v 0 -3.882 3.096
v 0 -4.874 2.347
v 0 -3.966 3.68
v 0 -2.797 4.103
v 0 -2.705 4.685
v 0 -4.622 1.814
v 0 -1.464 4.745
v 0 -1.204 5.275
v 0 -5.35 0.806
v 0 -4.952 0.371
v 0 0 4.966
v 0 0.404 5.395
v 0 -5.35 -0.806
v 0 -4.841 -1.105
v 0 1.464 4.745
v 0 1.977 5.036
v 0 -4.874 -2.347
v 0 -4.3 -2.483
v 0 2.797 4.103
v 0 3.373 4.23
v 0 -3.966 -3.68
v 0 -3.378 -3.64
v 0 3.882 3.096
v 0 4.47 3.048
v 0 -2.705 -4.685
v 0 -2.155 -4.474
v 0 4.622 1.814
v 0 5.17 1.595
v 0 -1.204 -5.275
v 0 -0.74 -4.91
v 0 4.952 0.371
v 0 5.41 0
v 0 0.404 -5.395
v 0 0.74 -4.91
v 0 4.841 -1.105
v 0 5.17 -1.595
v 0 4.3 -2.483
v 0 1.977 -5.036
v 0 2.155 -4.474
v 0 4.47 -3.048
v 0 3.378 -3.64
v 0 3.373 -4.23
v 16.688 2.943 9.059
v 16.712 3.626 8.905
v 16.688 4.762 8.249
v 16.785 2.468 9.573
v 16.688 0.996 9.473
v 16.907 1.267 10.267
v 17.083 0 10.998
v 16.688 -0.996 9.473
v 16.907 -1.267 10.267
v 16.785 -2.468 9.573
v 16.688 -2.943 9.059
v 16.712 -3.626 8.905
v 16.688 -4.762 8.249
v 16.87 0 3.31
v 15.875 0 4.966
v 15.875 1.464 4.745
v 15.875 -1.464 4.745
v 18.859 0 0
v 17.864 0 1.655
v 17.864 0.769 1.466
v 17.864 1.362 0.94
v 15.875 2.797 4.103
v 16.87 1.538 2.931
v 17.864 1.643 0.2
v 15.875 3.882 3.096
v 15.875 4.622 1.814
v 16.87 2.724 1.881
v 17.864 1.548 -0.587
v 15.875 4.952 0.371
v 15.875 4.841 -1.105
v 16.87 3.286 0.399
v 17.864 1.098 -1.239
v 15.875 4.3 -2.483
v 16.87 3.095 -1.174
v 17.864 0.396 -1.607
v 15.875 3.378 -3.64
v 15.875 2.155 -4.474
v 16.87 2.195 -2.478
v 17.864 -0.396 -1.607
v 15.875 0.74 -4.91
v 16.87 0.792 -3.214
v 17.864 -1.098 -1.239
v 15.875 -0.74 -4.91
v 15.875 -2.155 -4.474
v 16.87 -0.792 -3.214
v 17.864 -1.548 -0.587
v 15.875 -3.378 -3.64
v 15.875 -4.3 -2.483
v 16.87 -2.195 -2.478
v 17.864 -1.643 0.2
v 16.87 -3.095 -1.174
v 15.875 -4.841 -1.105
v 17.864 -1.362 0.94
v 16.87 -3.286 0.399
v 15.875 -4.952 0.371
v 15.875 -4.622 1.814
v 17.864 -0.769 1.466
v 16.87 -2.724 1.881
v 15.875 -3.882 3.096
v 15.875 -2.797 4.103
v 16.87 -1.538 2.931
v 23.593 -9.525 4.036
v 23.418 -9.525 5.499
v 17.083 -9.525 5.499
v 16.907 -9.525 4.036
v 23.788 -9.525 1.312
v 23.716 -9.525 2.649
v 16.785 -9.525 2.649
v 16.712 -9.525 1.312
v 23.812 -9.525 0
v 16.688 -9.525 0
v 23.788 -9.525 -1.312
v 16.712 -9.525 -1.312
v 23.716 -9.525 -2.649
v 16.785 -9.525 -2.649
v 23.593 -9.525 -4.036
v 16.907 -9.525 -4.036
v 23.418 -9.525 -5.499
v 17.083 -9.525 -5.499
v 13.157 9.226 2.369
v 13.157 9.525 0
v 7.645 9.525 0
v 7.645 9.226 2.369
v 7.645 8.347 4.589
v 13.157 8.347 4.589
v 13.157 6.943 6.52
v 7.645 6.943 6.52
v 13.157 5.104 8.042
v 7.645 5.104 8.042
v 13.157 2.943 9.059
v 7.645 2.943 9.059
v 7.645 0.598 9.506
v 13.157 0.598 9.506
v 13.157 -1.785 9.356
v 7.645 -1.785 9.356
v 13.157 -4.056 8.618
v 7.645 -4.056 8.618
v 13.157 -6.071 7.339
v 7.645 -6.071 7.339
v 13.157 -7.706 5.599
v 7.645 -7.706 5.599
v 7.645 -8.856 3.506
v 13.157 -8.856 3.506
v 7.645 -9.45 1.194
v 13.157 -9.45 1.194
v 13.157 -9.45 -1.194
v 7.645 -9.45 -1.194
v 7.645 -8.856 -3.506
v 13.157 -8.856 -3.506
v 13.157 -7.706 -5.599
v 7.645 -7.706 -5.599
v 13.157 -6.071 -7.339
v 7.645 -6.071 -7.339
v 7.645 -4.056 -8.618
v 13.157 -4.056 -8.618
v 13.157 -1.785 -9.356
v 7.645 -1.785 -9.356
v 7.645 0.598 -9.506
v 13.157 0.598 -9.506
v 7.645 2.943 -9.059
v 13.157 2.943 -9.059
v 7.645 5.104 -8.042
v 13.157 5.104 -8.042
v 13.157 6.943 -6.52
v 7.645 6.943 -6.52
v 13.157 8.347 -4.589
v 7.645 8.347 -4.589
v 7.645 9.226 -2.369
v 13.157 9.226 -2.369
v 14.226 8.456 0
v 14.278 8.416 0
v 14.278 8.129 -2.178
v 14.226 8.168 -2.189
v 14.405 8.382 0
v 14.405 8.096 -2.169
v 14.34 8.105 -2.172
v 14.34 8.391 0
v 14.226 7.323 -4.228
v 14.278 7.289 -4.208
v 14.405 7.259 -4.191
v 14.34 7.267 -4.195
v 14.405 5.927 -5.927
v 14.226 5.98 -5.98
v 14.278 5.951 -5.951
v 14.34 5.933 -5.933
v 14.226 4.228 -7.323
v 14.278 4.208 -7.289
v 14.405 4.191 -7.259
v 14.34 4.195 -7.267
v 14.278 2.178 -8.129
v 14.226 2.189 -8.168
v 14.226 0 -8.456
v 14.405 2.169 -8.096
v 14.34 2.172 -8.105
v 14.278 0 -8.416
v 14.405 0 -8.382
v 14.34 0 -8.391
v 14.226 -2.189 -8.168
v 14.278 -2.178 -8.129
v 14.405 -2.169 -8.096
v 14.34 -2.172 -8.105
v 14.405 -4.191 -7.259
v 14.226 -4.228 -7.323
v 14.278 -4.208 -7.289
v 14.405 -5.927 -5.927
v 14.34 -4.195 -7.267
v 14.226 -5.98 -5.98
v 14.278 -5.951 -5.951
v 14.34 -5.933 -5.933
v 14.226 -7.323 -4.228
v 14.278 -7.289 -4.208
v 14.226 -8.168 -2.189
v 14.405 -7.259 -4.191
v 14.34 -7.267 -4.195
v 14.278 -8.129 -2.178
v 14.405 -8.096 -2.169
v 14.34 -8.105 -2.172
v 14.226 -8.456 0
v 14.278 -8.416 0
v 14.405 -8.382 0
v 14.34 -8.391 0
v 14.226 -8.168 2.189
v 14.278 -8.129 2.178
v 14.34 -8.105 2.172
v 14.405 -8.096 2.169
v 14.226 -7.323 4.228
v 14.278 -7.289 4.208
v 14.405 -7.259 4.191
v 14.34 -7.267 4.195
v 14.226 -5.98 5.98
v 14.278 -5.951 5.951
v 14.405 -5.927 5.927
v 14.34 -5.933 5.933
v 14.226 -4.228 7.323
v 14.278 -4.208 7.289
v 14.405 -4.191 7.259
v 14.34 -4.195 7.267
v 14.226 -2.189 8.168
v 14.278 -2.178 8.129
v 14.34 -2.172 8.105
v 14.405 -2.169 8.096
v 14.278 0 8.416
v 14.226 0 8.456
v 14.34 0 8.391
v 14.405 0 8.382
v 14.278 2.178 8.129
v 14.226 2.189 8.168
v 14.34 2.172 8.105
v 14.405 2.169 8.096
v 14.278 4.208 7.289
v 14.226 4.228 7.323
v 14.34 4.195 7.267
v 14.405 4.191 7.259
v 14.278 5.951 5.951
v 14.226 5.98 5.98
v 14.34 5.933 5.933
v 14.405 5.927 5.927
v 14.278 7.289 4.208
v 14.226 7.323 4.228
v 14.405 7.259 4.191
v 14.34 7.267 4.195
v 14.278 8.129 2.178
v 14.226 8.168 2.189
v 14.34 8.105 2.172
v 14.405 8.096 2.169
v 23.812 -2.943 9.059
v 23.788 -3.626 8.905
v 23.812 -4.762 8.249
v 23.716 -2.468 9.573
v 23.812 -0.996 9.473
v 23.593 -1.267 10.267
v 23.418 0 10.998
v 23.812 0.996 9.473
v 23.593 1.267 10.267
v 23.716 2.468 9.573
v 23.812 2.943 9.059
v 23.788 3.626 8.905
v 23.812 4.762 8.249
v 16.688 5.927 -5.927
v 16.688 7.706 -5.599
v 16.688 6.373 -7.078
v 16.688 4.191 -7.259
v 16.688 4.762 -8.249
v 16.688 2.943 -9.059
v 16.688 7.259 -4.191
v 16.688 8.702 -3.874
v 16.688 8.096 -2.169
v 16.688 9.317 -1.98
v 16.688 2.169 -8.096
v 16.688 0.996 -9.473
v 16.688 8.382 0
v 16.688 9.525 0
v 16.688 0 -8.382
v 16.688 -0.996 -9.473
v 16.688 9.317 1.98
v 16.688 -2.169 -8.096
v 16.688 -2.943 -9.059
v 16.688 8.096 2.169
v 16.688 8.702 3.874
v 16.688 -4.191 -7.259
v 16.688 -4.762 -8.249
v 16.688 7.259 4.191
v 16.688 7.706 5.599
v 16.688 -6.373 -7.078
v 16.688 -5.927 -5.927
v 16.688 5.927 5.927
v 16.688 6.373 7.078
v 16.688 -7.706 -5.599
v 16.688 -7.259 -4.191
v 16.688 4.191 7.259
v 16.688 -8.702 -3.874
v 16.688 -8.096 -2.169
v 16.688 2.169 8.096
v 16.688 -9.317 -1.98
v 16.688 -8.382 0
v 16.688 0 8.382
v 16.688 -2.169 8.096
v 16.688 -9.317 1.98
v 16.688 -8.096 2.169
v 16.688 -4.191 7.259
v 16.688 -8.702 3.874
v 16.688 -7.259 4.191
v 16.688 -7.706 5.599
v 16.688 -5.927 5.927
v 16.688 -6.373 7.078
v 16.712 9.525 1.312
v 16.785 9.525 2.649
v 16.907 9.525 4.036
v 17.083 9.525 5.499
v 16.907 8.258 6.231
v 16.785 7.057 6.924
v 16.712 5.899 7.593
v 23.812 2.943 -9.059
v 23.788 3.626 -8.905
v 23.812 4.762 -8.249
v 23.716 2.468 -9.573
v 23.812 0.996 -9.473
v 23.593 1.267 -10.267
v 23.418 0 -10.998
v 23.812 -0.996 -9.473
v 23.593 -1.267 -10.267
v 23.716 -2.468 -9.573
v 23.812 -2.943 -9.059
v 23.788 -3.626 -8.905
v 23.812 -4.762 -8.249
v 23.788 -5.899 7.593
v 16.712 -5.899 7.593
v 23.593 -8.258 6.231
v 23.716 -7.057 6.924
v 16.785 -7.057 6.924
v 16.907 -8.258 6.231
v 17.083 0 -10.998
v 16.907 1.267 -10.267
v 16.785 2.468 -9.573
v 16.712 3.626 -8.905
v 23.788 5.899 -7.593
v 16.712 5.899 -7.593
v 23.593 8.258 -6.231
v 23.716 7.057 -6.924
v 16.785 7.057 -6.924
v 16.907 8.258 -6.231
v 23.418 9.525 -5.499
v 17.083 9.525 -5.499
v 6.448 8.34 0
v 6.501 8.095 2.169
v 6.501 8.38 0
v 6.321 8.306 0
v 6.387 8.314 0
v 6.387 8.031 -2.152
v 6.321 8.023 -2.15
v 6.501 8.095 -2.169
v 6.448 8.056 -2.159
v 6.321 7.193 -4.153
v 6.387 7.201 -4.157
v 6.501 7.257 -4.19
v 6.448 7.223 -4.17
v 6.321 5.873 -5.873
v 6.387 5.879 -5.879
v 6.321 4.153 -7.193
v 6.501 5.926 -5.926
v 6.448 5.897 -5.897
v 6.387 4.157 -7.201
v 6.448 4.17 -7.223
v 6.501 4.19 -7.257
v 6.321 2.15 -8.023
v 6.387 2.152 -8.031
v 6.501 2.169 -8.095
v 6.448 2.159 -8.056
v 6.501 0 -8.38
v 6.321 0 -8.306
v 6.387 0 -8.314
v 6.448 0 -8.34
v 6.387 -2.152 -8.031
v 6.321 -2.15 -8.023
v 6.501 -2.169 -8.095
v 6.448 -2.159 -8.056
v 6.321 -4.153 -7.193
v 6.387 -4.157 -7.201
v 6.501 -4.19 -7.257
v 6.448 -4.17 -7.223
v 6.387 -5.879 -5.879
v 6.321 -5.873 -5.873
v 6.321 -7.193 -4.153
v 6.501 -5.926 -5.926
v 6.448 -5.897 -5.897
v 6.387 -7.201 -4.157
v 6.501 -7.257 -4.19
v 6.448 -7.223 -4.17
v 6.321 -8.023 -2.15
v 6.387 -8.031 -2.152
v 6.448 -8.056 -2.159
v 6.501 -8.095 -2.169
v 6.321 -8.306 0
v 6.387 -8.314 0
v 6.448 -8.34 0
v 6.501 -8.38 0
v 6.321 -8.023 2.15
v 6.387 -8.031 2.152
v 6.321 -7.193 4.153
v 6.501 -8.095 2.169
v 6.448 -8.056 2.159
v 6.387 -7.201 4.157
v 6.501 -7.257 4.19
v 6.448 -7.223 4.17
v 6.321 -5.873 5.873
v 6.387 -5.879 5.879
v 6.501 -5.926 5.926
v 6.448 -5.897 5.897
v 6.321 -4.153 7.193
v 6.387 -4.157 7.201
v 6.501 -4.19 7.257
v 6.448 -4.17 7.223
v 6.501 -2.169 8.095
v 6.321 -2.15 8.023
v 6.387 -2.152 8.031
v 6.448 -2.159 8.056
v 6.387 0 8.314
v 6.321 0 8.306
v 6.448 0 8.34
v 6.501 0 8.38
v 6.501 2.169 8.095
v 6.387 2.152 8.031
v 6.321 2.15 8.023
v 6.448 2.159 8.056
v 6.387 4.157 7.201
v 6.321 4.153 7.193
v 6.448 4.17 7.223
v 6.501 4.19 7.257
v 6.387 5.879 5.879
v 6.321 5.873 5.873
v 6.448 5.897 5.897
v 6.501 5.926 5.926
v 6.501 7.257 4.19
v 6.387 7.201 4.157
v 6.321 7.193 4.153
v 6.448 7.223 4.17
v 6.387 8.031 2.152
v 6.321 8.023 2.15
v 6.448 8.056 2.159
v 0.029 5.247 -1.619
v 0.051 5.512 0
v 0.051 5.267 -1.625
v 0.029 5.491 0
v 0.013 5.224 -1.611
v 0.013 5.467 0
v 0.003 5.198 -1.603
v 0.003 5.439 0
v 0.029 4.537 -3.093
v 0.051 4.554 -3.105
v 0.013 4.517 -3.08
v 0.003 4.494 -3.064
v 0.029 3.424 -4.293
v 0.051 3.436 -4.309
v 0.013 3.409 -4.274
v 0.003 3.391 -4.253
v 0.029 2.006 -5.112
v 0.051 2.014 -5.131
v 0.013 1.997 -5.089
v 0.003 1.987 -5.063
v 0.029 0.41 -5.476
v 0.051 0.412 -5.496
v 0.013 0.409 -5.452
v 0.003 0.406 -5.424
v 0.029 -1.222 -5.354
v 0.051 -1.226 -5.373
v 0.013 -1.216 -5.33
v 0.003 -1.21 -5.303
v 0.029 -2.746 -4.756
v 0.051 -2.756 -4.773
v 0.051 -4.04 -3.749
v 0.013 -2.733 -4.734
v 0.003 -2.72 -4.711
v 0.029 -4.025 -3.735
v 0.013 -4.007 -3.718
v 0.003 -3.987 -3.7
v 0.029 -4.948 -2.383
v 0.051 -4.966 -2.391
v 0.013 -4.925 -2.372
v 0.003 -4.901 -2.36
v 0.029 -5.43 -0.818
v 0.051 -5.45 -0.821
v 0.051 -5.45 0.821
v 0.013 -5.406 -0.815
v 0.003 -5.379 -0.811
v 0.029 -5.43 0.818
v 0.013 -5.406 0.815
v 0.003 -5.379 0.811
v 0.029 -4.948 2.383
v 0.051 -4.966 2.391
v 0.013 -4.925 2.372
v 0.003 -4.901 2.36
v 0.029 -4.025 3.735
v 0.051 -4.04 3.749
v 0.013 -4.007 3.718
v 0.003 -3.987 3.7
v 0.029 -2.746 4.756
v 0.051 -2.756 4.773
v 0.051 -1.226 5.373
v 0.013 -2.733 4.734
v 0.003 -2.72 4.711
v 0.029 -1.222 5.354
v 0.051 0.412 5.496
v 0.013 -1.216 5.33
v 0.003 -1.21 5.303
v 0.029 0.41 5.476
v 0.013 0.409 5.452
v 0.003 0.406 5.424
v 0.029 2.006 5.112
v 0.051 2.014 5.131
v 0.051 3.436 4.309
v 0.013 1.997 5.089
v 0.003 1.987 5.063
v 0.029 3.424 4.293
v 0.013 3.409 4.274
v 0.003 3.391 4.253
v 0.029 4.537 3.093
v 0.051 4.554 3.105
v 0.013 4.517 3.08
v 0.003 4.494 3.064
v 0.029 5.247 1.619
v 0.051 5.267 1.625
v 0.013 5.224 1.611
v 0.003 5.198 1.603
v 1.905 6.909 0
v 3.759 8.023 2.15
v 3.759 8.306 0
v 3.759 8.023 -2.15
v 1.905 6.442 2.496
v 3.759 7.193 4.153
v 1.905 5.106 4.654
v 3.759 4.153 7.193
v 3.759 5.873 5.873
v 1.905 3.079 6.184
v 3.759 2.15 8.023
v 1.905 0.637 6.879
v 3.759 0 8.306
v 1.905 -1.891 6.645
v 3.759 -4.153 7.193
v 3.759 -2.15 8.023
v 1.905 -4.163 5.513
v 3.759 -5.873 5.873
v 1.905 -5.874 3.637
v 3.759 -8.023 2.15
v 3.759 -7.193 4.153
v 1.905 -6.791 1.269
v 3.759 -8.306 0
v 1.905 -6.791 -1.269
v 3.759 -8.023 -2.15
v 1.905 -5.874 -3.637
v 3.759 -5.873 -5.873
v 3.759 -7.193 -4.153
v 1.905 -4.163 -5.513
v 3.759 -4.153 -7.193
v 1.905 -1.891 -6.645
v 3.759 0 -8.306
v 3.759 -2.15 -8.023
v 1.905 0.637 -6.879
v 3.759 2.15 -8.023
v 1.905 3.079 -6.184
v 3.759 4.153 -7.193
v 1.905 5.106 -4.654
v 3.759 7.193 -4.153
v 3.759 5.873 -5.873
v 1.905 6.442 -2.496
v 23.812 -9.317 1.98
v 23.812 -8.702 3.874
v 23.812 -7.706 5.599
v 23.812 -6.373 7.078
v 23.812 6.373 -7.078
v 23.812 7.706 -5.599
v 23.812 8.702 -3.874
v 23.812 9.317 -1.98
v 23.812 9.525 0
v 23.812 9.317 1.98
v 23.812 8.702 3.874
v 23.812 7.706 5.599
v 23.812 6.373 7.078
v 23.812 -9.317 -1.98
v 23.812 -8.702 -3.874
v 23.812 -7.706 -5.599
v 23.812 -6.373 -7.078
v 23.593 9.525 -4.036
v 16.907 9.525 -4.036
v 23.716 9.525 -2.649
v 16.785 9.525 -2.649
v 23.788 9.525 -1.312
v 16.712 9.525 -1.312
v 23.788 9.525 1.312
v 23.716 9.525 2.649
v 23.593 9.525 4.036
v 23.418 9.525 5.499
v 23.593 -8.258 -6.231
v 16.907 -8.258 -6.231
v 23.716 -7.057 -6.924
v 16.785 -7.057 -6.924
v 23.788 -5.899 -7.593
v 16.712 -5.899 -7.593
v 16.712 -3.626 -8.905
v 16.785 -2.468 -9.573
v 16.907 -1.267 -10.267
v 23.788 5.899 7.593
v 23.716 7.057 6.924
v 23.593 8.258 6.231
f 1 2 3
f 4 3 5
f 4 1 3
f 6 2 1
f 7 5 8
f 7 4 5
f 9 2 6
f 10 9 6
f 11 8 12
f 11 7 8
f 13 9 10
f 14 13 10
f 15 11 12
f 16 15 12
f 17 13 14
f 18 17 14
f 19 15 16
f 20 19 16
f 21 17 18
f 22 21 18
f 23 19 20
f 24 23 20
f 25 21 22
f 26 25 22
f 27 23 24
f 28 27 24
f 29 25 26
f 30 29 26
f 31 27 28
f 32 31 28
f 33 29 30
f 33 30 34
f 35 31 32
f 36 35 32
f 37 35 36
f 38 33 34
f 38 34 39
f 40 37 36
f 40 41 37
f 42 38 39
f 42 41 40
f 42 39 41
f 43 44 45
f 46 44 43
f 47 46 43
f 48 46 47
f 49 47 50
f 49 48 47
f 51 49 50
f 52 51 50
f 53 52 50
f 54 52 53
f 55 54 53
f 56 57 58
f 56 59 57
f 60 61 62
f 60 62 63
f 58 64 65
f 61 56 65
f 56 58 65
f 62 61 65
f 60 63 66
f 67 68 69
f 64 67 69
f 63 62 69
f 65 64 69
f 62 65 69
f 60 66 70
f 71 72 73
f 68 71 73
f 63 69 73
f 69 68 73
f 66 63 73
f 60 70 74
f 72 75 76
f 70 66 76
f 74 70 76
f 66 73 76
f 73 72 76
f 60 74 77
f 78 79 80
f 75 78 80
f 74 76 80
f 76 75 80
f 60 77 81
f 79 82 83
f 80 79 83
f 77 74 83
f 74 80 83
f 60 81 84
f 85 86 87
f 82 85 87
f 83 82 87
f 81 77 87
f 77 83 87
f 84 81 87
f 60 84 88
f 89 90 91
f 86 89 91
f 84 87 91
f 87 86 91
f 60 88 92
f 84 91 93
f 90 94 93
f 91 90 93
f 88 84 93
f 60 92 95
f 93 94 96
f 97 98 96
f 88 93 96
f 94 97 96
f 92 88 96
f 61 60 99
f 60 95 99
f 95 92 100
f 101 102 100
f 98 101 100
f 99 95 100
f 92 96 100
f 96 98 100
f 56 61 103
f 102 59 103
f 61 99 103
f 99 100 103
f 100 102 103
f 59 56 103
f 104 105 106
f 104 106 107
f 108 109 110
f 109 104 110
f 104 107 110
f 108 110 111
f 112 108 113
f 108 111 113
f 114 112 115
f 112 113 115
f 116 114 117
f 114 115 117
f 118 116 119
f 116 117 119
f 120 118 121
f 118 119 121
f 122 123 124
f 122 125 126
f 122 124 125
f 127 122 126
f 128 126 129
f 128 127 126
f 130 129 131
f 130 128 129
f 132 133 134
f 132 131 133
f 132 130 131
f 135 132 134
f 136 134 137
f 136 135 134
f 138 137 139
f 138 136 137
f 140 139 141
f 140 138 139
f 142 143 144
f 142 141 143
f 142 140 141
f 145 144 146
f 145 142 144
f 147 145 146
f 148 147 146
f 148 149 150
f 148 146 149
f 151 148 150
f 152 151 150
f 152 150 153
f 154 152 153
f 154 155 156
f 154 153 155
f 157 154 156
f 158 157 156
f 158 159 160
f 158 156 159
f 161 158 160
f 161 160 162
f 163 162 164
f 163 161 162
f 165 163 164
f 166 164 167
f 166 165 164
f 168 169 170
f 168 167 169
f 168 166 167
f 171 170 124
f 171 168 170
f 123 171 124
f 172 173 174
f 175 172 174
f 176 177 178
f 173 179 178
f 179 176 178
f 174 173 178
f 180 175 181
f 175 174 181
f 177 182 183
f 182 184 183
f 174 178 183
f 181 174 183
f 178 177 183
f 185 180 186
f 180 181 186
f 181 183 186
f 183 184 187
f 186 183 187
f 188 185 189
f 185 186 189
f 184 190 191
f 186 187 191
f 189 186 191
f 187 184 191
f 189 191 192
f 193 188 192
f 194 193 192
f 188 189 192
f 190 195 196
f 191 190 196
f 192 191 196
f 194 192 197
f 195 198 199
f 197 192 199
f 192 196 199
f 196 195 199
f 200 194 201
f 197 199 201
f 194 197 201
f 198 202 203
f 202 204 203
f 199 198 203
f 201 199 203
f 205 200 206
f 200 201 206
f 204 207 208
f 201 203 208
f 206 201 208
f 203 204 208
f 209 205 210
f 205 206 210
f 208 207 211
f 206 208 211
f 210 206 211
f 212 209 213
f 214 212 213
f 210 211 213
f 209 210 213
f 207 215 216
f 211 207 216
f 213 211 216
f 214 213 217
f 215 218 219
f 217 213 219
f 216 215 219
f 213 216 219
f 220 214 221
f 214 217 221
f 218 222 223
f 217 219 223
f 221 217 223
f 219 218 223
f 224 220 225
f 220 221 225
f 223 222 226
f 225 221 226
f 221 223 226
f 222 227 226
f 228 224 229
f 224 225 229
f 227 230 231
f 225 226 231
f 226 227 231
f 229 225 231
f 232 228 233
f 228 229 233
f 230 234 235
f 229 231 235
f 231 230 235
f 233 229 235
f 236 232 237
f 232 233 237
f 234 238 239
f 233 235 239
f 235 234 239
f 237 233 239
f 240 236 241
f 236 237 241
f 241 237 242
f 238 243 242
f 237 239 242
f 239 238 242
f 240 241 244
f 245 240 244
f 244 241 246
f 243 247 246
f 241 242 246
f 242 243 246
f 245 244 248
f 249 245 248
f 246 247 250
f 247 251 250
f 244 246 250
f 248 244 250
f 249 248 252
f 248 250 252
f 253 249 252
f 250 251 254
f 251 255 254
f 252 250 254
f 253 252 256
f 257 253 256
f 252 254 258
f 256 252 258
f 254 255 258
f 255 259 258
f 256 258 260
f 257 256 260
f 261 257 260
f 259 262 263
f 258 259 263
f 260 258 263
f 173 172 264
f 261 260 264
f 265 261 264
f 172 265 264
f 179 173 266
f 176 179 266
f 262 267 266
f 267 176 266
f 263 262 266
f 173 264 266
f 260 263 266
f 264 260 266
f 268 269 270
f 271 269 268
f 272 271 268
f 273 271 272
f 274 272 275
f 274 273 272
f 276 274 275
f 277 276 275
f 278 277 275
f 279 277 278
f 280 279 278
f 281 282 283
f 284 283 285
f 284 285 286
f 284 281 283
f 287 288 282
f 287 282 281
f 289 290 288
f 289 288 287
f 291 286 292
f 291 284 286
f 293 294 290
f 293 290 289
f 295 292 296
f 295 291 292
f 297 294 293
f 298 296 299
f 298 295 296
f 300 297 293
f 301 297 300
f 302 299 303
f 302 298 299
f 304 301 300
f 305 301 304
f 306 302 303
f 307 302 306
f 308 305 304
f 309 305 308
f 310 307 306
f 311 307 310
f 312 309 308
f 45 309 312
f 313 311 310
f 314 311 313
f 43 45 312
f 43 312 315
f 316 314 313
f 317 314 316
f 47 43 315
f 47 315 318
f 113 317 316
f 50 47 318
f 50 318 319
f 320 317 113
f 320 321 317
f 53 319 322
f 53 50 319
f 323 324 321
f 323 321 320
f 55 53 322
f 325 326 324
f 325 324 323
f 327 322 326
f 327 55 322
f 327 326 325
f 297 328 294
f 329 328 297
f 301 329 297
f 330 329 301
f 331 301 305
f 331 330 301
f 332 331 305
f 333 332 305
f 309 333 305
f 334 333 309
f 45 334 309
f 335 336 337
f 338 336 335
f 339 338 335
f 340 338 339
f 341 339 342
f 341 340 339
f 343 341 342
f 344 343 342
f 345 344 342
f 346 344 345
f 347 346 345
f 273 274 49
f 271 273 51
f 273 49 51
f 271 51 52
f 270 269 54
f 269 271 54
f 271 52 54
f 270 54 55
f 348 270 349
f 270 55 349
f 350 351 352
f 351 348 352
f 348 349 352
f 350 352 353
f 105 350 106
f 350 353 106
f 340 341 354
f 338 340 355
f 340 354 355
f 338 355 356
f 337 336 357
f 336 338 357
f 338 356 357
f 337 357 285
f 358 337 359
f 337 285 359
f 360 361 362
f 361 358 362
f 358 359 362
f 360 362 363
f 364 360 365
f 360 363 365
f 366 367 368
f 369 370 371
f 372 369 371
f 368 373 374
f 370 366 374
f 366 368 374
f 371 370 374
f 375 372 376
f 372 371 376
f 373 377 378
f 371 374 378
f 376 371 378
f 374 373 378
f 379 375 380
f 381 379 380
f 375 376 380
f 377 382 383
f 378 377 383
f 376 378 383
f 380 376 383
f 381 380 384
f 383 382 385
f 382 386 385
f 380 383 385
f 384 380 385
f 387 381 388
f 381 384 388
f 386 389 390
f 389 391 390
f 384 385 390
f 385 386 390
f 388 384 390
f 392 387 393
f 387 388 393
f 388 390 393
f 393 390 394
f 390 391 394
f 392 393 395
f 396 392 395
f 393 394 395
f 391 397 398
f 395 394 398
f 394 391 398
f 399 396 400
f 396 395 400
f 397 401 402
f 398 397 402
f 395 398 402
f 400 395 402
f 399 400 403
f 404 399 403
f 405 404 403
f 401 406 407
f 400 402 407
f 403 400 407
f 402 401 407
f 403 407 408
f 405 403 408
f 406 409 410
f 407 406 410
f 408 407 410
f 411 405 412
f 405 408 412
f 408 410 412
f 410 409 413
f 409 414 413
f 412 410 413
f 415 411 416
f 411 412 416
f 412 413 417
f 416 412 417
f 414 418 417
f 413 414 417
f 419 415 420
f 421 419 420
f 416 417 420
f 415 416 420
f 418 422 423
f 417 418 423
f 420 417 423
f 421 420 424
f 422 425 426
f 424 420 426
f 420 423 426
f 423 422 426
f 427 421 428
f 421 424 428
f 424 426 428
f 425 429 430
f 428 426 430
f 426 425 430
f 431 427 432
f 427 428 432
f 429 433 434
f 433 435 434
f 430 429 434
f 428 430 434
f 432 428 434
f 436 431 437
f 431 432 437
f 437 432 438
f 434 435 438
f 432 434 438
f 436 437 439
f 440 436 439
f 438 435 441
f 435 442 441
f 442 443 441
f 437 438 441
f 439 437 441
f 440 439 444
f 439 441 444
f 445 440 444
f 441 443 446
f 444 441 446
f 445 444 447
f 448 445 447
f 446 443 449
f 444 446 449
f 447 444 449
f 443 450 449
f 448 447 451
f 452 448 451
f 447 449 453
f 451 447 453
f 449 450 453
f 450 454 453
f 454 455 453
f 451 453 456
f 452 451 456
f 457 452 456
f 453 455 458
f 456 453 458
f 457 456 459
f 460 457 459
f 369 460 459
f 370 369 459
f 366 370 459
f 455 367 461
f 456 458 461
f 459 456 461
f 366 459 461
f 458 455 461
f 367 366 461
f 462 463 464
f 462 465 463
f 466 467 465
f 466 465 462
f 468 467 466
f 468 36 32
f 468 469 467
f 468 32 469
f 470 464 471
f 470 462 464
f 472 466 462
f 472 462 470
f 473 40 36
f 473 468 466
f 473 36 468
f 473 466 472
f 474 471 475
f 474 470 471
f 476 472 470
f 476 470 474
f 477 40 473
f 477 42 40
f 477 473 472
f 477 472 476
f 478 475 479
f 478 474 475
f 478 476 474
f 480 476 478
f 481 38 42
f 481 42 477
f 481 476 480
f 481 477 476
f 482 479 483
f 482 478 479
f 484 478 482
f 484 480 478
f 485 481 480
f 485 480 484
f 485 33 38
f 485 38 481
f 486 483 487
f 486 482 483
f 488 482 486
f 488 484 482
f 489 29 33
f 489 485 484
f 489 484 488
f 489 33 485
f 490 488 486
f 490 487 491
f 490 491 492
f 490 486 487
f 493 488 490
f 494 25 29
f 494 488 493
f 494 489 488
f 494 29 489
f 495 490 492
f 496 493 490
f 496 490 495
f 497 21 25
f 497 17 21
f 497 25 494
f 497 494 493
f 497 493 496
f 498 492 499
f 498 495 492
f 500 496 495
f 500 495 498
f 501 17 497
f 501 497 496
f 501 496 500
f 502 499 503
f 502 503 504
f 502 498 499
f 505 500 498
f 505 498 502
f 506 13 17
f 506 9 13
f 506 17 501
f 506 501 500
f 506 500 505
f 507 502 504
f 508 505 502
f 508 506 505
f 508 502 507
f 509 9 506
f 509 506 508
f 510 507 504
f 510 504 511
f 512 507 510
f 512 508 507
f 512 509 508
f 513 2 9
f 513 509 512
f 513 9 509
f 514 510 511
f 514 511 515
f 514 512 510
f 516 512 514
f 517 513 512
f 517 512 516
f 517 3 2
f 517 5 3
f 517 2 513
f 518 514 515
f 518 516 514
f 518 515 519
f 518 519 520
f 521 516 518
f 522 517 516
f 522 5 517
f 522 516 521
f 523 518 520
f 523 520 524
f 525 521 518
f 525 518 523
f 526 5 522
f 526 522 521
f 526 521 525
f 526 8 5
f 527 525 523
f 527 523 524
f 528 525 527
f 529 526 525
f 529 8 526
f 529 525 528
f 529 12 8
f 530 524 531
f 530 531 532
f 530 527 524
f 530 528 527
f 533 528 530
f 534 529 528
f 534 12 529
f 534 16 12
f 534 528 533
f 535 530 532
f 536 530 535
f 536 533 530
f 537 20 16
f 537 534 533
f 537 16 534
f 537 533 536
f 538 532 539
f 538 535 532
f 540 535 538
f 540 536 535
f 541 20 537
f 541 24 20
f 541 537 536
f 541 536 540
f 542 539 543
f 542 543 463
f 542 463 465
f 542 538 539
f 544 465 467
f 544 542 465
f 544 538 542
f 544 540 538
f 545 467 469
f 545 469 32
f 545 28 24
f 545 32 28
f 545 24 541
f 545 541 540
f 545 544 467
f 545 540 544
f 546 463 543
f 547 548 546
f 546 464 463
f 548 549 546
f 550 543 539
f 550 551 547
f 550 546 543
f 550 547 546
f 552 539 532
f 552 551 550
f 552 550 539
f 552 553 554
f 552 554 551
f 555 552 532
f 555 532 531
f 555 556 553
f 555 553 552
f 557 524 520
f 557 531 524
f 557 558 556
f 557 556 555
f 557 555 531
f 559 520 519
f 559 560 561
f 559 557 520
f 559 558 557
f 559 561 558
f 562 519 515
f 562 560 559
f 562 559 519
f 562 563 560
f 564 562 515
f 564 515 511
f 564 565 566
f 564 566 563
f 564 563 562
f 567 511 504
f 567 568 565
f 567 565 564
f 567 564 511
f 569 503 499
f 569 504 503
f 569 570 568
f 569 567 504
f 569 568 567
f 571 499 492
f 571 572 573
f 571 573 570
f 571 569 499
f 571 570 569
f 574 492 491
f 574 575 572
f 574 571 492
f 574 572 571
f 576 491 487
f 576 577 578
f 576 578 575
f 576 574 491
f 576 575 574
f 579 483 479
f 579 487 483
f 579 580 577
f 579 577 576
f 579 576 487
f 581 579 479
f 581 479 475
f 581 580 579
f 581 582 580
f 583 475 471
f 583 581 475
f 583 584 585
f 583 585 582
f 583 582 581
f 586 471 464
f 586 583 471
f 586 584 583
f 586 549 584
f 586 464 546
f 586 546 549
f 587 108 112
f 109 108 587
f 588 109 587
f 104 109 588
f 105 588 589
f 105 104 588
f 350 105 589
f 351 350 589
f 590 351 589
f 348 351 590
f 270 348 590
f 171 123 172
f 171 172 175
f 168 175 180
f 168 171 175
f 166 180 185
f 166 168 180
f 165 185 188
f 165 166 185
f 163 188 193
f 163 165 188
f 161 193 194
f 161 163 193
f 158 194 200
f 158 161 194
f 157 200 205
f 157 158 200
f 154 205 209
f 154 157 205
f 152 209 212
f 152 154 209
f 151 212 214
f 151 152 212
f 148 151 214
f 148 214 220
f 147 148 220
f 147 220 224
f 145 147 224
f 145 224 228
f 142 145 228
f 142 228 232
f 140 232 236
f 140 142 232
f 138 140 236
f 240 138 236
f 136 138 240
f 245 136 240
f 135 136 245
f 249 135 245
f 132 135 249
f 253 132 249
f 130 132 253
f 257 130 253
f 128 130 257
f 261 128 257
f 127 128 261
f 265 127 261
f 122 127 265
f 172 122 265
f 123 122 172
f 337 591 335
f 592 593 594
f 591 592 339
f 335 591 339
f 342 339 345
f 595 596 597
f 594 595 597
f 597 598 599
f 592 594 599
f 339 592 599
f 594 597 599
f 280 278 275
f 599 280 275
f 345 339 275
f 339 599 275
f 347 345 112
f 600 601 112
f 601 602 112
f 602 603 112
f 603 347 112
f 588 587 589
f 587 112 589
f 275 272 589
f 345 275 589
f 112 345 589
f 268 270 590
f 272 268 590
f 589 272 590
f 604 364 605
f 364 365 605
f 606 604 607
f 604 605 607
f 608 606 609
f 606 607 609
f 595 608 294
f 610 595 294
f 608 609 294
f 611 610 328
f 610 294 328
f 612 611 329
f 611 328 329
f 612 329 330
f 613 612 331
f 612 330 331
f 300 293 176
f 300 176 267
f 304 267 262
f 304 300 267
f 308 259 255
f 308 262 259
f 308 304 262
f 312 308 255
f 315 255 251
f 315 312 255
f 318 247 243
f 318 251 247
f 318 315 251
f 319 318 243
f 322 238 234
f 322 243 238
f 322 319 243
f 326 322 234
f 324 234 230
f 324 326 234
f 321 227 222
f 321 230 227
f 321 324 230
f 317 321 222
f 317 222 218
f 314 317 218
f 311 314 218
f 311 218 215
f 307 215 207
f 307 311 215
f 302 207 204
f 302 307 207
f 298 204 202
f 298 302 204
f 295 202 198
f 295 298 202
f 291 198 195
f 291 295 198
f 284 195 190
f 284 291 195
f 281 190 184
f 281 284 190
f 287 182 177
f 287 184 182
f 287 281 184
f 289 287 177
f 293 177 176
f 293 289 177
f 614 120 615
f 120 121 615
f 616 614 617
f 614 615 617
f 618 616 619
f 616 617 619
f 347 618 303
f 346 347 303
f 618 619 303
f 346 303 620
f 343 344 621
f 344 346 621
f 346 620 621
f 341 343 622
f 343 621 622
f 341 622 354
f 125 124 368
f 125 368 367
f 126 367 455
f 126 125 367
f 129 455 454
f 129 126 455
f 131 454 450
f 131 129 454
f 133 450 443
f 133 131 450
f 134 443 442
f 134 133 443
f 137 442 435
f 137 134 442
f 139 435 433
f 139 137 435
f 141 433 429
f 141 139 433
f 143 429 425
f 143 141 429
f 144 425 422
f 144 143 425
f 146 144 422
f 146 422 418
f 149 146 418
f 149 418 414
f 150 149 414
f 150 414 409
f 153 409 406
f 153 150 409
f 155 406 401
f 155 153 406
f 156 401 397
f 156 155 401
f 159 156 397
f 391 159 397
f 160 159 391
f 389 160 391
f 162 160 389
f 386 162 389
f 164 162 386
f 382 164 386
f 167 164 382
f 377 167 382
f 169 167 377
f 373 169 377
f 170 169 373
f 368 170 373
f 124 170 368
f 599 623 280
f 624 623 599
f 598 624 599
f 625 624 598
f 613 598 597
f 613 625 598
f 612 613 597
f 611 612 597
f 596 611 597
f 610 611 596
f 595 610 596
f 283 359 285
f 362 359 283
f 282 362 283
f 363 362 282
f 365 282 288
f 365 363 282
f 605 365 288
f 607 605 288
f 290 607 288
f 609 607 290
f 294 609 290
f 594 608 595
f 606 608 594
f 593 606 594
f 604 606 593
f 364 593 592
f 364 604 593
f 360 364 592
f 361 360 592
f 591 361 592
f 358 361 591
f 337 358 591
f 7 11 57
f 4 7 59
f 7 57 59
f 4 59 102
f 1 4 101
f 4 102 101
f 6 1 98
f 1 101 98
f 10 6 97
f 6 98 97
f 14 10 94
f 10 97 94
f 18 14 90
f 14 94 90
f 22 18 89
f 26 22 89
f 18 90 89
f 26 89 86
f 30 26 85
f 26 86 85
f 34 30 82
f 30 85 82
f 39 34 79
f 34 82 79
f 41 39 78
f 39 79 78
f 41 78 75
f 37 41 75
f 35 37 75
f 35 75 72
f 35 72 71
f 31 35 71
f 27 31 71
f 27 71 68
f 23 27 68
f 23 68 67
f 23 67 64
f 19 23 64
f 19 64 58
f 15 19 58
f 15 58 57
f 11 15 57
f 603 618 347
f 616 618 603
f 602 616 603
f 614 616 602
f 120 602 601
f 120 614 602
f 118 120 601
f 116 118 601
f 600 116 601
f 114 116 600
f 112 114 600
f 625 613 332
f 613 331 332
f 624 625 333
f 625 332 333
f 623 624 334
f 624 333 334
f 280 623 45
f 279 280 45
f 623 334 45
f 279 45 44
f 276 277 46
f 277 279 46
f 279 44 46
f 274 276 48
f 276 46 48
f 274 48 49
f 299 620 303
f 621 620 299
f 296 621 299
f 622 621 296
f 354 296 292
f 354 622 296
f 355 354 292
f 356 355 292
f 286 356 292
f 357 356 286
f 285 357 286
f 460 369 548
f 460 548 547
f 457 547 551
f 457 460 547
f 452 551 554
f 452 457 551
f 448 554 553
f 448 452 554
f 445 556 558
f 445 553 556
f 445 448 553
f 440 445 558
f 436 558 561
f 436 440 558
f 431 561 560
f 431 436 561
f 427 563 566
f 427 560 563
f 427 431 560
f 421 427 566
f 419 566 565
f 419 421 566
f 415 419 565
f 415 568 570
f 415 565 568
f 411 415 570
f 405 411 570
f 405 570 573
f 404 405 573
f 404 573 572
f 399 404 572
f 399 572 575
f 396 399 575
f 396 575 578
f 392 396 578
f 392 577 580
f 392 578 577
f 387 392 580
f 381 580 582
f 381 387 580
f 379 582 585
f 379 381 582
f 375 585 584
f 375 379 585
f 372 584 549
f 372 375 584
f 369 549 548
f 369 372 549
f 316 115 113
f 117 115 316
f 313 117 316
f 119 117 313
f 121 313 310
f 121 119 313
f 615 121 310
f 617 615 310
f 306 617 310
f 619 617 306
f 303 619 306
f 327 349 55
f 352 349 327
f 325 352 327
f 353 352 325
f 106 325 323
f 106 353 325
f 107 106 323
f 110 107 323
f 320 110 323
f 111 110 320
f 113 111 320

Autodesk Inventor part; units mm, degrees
ref_plane "YZ Plane" through (0, 0, 0) normal (1, 0, 0) x (0, 1, 0)
ref_plane "XZ Plane" through (0, 0, 0) normal (0, 1, 0) x (-1, 0, 0)
sketch "Sketch4" plane through (0, 0, 0) normal (0, 0, 1) x (1, 0, 0)
  line L0 (0, 0) -> (0, 5.4102)
  line L1 (0.0506, 5.5116) -> (3.7586, 8.3058)
  line L2 (3.7586, 8.3058) -> (6.321, 8.3058)
  line L3 (6.5006, 8.3802) -> (7.6454, 9.525)
  line L4 (7.6454, 9.525) -> (13.1572, 9.525)
  line L5 (13.1572, 9.525) -> (14.2258, 8.4564)
  line L6 (14.4054, 8.382) -> (16.6878, 8.382)
  line L7 (16.6878, 8.382) -> (16.6878, 0)
  line L8 (16.6878, 0) -> (0, 0)
  arc A0 (0.0506, 5.5116) -> (0, 5.4102) centre (0.127, 5.4102) ccw
  arc A1 (6.321, 8.3058) -> (6.5006, 8.3802) centre (6.321, 8.5598) ccw
  arc A2 (14.2258, 8.4564) -> (14.4054, 8.382) centre (14.4054, 8.636) ccw
  point P0 (6.4262, 8.3058)
  point P1 (14.3002, 8.382)
  dimension "d26" = 45
  dimension "d28" = 16.6878
  dimension "d29" = 0.127
  dimension "d30" = 5.4102
  dimension "d31" = 37
  dimension "d32" = 6.4262
  dimension "d33" = 8.3058
  dimension "d34" = 0.254
  dimension "d35" = 8.382
  dimension "d36" = 9.525
  dimension "d37" = 45
  dimension "d39" = 2.3876
revolve "Revolution3" add sketch "Sketch4" angle 360 about axis through (16.6878, 0, 0) along (-1, 0, 0)
ref_plane "Work Plane3" through (11.9062, 0, 0) normal (-1, 0, 0) x (0, 0, 1)
sketch "Sketch5" plane through (16.6878, 8.382, 0) normal (-1, 0, 0) x (0, -1, 0)
  line L0 (-1.143, 5.4993) -> (8.382, 10.9985)
  line L1 (8.382, 10.9985) -> (17.907, 5.4993)
  line L2 (17.907, 5.4993) -> (17.907, -5.4993)
  line L3 (17.907, -5.4993) -> (8.382, -10.9985)
  line L4 (8.382, -10.9985) -> (-1.143, -5.4993)
  line L5 (-1.143, -5.4993) -> (-1.143, 5.4993)
  circle A0 centre (8.382, 0) radius 10.9985 construction
  dimension "d42" = 21.9971
  dimension "d41" = 19.05
extrude "Extrusion2" add sketch "Sketch5" against normal blind 7.1247
sketch "Sketch7" plane through (0, 0, 0) normal (-1, 0, 0) x (0, 0, 1)
  circle A0 centre (0, 0) radius 5.4102 projected
hole "Hole1" at (0, 0, 0) direction (1, 0, 0) diameter 9.9314 depth 15.875 tip angle 118
thread "Thread3" size "3/4-16 UNF" class "3A" standard "ANSI Unified Screw Threads" full length
sketch "Sketch8" plane through (0, 0, 0) normal (0, 1, 0) x (-1, 0, 0)
  line L0 (-14.4054, 8.382) -> (-16.6878, 8.382) construction
  line L1 (-16.6878, 5.4993) -> (-16.6878, 10.9985) construction
  line L2 (-16.6878, 5.4993) -> (-16.6878, 10.9985) construction
  line L3 (-16.6878, 10.9985) -> (-23.8125, 10.9985) construction
  line L4 (-16.6878, 5.4993) -> (-23.8125, 5.4993) construction
  line L5 (-17.0826, 10.9985) -> (-16.6878, 9.525)
  line L6 (-17.0826, 10.9985) -> (-16.6878, 10.9985)
  line L7 (-16.6878, 9.525) -> (-16.6878, 10.9985)
  line L8 (-20.2502, 10.9985) -> (-20.2502, 5.4993)
  line L9 (-23.4177, 10.9985) -> (-23.8125, 9.525)
  line L10 (-23.4177, 10.9985) -> (-23.8125, 10.9985)
  line L11 (-23.8125, 9.525) -> (-23.8125, 10.9985)
  line L12 (8.8106, 0) -> (-52.8638, 0) projected
  line L13 (-23.8125, 5.4993) -> (-23.8125, 10.9985) projected
  point P0 (0, 0)
  point P1 (-23.8125, 10.9985)
  dimension "d62" = 9.525
  dimension "d64" = 15
revolve "Revolution5" cut sketch "Sketch8" angle 360 about axis through (-10, 0, 0) along (1, 0, 0)
equation "\"d28\" = MS33656_J"
equation "\"d30\" = 0.5 * MS33656_D"
equation "\"d32\" = MS33656_B"
equation "\"d33\" = 0.5 * MS33656_C"
equation "\"d35\" = 0.5 * MS33656_F"
equation "\"d36\" = 0.5 * AN806_T"
equation "\"d39\" = MS33656_Q"
equation "\"d41\" = AN806_C"
equation "\"d44\" = AN806_B - MS33656_J"
equation "\"d53\" = MS33656_A"
equation "\"d58\" = AN806_A"
equation "\"d62\" = 0.5 * AN806_C"
equation "\"AN806_T\" = 19.05"
equation "\"AN806_C\" = 19.05"
equation "\"AN806_B\" = 23.8125"
equation "\"MS33656_A\" = 9.9314"
equation "\"MS33656_D\" = 10.8204"
equation "\"MS33656_B\" = 6.4262"
equation "\"MS33656_C\" = 16.6116"
equation "\"MS33656_F\" = 16.764"
equation "\"MS33656_J\" = 16.6878"
equation "\"MS33656_Q\" = 2.3876"
equation "\"d79\" = -0.5 * AN806_B"
equation "\"Tube_OD\" = 12.7"
equation "\"AN806_A\" = 15.875"
properties part number "AN815-8D" material "Aluminum 2014-T6"
